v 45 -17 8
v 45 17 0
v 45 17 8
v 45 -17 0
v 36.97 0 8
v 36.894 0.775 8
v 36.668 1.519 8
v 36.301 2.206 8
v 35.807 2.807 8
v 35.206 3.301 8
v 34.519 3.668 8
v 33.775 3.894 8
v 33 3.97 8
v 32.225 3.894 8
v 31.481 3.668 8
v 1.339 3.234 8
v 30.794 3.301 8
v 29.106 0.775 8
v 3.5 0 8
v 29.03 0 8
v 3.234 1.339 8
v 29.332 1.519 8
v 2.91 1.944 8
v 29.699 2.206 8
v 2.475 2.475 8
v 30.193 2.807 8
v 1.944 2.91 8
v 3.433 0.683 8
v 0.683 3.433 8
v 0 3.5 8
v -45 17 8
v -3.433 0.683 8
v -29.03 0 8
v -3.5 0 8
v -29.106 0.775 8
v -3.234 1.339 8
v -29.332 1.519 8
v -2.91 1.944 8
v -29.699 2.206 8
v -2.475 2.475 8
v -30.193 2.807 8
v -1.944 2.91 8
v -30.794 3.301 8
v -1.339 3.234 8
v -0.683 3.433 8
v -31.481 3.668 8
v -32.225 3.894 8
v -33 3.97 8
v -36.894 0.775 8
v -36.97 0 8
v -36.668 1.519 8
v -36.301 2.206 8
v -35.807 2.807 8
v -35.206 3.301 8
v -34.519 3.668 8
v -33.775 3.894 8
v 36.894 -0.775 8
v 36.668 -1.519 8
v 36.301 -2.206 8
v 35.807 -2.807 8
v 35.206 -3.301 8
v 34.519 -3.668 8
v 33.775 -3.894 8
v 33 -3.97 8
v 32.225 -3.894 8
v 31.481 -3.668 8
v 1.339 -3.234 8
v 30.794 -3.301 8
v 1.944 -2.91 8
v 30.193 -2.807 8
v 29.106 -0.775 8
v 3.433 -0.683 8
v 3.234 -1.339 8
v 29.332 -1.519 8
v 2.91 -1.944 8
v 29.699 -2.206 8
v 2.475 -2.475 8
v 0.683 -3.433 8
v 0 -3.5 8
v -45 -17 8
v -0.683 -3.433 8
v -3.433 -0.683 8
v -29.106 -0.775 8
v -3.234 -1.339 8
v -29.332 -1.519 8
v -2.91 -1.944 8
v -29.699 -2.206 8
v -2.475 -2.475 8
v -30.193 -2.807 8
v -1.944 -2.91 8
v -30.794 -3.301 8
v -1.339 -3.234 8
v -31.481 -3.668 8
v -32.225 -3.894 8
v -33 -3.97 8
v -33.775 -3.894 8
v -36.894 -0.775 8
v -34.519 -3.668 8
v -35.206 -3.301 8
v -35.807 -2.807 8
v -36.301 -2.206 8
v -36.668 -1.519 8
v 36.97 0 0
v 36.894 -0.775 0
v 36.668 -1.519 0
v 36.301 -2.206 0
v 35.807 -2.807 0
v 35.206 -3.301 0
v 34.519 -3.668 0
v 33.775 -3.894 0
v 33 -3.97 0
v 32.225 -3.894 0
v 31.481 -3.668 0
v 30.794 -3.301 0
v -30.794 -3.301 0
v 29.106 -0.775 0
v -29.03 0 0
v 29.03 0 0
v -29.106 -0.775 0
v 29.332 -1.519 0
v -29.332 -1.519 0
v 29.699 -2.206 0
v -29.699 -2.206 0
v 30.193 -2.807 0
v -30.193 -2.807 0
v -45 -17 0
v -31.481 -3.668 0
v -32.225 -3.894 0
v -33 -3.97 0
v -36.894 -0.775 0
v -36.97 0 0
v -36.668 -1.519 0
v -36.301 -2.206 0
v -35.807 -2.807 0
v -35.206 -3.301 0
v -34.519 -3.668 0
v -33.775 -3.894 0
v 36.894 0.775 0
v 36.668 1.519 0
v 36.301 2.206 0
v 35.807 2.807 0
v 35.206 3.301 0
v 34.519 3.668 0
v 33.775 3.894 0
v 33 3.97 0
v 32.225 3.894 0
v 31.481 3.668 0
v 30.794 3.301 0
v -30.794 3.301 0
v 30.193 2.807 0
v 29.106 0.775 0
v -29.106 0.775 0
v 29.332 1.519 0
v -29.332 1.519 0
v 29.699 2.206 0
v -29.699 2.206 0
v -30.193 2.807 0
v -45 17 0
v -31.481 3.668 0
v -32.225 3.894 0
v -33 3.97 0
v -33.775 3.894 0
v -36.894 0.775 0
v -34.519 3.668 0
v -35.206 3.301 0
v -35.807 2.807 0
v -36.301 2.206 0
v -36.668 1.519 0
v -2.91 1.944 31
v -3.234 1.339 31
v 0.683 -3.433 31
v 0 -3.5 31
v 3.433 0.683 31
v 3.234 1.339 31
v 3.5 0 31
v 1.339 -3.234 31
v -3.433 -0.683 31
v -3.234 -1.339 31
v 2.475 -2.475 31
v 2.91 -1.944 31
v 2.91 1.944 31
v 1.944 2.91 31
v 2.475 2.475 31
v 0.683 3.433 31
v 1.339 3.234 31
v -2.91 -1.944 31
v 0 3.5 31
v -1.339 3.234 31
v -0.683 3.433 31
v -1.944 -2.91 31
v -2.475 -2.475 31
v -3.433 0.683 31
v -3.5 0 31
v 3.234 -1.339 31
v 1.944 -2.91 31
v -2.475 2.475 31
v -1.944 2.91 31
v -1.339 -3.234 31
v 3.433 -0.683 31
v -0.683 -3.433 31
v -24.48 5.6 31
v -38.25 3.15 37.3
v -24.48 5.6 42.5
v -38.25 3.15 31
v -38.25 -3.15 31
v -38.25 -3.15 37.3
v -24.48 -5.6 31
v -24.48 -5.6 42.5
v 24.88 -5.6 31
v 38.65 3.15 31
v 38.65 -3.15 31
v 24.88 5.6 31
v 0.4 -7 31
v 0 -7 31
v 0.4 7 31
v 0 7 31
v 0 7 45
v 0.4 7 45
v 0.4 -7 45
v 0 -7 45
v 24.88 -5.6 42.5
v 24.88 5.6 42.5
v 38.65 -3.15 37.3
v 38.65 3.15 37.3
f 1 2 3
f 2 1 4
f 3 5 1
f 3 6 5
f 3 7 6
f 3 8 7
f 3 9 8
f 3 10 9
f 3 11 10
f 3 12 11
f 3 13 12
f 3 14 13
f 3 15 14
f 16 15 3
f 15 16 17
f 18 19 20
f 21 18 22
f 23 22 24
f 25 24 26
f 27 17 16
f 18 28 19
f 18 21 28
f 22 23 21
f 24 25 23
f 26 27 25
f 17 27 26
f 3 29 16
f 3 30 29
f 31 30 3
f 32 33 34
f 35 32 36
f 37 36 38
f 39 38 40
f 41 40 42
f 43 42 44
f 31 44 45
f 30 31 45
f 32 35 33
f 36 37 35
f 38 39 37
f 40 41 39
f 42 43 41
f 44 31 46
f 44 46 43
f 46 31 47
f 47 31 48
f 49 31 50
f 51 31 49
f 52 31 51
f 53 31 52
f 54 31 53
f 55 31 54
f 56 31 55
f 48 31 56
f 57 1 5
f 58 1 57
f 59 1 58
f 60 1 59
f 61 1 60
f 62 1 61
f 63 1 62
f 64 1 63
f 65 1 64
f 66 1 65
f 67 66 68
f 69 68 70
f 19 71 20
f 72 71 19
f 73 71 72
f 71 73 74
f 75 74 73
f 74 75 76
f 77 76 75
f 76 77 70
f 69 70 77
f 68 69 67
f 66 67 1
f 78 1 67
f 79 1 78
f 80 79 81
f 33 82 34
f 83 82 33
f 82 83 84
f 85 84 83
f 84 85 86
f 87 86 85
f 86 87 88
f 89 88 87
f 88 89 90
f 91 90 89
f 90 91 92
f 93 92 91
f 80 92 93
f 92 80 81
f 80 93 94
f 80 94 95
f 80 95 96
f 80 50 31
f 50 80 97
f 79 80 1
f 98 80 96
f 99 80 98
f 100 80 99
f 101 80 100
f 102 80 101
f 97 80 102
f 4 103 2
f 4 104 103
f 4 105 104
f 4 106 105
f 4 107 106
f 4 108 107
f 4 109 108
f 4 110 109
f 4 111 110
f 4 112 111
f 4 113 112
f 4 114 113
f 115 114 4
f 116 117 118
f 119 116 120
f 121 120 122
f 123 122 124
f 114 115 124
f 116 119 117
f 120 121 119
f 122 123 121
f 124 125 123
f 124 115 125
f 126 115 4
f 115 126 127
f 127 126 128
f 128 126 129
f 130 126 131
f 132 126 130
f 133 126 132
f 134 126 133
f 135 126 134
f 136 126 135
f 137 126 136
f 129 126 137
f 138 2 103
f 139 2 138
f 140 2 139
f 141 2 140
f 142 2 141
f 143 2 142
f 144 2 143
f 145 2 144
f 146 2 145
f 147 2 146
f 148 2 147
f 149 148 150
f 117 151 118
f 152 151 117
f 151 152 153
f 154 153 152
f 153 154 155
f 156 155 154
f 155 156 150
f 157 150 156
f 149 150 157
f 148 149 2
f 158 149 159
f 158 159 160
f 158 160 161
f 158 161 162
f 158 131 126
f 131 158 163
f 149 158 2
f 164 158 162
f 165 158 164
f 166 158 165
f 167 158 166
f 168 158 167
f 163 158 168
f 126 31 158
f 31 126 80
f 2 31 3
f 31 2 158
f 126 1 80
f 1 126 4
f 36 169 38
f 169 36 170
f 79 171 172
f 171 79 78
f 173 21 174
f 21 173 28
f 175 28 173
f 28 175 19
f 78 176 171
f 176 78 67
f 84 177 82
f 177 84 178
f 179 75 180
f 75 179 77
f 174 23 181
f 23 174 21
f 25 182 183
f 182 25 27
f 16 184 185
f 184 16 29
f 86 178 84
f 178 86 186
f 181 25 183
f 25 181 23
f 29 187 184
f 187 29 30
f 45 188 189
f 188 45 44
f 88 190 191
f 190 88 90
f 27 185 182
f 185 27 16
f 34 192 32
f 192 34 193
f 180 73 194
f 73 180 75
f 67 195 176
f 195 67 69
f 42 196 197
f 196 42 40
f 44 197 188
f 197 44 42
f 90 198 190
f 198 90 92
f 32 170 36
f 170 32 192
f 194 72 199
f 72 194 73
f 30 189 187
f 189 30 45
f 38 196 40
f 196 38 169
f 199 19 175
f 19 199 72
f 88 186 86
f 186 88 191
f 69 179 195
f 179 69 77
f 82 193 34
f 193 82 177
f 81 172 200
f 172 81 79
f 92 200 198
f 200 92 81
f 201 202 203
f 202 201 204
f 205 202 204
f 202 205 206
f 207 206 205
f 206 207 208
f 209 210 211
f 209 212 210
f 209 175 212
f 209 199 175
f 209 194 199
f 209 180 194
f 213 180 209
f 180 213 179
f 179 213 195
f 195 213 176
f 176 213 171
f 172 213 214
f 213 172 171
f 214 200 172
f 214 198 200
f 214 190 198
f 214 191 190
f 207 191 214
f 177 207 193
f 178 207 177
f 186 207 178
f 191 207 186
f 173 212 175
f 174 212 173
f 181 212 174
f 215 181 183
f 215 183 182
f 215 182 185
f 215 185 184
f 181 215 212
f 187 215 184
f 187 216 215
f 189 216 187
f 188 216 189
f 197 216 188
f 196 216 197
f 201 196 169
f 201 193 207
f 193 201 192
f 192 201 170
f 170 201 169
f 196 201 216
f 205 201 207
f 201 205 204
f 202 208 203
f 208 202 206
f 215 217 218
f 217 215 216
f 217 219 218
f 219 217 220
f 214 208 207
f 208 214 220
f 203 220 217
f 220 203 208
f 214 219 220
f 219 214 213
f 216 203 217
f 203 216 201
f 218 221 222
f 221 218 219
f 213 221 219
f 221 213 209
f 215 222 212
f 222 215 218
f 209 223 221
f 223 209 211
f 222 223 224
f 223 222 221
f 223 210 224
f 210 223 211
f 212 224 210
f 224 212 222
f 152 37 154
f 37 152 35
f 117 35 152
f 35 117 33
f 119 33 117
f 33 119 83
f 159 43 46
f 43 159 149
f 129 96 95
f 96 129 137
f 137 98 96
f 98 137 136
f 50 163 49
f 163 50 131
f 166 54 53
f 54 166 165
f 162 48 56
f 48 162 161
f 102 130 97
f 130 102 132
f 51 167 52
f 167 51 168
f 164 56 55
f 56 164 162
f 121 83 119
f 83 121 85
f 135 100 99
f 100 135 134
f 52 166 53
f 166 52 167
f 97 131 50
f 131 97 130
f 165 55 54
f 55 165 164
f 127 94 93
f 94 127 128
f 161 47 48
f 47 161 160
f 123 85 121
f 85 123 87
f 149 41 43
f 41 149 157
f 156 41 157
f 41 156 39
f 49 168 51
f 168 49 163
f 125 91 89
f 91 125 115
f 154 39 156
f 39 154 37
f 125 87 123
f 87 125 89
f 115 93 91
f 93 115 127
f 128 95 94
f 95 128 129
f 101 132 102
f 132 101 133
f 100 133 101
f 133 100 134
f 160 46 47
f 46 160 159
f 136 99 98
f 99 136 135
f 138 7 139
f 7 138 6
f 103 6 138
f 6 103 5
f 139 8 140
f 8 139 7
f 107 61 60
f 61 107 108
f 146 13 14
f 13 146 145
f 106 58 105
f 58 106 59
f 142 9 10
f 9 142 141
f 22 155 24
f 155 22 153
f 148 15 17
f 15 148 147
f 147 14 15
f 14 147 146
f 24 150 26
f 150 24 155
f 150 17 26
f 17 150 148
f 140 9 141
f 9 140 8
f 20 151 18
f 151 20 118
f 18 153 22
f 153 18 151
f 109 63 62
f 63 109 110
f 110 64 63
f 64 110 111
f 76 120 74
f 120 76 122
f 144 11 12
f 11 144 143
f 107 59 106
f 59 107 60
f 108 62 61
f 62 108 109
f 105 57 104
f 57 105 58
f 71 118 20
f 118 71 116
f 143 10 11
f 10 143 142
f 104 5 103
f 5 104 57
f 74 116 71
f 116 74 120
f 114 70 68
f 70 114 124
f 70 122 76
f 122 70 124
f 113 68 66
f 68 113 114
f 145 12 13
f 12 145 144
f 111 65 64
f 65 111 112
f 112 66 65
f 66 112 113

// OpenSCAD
$fn = 32;

// ----------------------------------------------------------------------
// Boat cleat: 90 mm base, horn 38 mm up
// ----------------------------------------------------------------------

// --- parameters (mm) ---
base_l = 90;              // base length
base_w = 34;              // base width
base_t = 8;               // base thickness
horn_len = 76.5;          // horn length
horn_d = 14;              // horn diameter at the middle
horn_z = 38;              // horn axis height
end_drop = 10;            // how far the horn tips drop
post_d = 7;               // centre post diameter
holes_d = 7.94;           // fixing holes
hole_x = 33;              // fixing hole spacing

difference() {
  union() {
    translate([-45, -17, 0]) cube([base_l, base_w, base_t]);
    /* centre post, sunk 1 mm into the base */
    translate([0, 0, 7]) cylinder(h = 31, d = post_d);
    /* horn: a hull chain of boxes, full in the middle and lighter at the tips */
    hull() {
      translate([-38.25, -3.15, 31]) cube([0.4, 6.3, 6.3], center = false);
      translate([-24.48, -5.6, 31]) cube([0.4, 11.2, 11.5], center = false);
    }
    hull() {
      translate([-24.48, -5.6, 31]) cube([0.4, 11.2, 11.5], center = false);
      translate([0, -7, 31]) cube([0.4, 14, 14], center = false);
    }
    hull() {
      translate([0, -7, 31]) cube([0.4, 14, 14], center = false);
      translate([24.48, -5.6, 31]) cube([0.4, 11.2, 11.5], center = false);
    }
    hull() {
      translate([24.48, -5.6, 31]) cube([0.4, 11.2, 11.5], center = false);
      translate([38.25, -3.15, 31]) cube([0.4, 6.3, 6.3], center = false);
    }
  }
  translate([-33, 0, -2.5]) cylinder(h = base_t + 5, d = holes_d);
  translate([33, 0, -2.5]) cylinder(h = base_t + 5, d = holes_d);
}
